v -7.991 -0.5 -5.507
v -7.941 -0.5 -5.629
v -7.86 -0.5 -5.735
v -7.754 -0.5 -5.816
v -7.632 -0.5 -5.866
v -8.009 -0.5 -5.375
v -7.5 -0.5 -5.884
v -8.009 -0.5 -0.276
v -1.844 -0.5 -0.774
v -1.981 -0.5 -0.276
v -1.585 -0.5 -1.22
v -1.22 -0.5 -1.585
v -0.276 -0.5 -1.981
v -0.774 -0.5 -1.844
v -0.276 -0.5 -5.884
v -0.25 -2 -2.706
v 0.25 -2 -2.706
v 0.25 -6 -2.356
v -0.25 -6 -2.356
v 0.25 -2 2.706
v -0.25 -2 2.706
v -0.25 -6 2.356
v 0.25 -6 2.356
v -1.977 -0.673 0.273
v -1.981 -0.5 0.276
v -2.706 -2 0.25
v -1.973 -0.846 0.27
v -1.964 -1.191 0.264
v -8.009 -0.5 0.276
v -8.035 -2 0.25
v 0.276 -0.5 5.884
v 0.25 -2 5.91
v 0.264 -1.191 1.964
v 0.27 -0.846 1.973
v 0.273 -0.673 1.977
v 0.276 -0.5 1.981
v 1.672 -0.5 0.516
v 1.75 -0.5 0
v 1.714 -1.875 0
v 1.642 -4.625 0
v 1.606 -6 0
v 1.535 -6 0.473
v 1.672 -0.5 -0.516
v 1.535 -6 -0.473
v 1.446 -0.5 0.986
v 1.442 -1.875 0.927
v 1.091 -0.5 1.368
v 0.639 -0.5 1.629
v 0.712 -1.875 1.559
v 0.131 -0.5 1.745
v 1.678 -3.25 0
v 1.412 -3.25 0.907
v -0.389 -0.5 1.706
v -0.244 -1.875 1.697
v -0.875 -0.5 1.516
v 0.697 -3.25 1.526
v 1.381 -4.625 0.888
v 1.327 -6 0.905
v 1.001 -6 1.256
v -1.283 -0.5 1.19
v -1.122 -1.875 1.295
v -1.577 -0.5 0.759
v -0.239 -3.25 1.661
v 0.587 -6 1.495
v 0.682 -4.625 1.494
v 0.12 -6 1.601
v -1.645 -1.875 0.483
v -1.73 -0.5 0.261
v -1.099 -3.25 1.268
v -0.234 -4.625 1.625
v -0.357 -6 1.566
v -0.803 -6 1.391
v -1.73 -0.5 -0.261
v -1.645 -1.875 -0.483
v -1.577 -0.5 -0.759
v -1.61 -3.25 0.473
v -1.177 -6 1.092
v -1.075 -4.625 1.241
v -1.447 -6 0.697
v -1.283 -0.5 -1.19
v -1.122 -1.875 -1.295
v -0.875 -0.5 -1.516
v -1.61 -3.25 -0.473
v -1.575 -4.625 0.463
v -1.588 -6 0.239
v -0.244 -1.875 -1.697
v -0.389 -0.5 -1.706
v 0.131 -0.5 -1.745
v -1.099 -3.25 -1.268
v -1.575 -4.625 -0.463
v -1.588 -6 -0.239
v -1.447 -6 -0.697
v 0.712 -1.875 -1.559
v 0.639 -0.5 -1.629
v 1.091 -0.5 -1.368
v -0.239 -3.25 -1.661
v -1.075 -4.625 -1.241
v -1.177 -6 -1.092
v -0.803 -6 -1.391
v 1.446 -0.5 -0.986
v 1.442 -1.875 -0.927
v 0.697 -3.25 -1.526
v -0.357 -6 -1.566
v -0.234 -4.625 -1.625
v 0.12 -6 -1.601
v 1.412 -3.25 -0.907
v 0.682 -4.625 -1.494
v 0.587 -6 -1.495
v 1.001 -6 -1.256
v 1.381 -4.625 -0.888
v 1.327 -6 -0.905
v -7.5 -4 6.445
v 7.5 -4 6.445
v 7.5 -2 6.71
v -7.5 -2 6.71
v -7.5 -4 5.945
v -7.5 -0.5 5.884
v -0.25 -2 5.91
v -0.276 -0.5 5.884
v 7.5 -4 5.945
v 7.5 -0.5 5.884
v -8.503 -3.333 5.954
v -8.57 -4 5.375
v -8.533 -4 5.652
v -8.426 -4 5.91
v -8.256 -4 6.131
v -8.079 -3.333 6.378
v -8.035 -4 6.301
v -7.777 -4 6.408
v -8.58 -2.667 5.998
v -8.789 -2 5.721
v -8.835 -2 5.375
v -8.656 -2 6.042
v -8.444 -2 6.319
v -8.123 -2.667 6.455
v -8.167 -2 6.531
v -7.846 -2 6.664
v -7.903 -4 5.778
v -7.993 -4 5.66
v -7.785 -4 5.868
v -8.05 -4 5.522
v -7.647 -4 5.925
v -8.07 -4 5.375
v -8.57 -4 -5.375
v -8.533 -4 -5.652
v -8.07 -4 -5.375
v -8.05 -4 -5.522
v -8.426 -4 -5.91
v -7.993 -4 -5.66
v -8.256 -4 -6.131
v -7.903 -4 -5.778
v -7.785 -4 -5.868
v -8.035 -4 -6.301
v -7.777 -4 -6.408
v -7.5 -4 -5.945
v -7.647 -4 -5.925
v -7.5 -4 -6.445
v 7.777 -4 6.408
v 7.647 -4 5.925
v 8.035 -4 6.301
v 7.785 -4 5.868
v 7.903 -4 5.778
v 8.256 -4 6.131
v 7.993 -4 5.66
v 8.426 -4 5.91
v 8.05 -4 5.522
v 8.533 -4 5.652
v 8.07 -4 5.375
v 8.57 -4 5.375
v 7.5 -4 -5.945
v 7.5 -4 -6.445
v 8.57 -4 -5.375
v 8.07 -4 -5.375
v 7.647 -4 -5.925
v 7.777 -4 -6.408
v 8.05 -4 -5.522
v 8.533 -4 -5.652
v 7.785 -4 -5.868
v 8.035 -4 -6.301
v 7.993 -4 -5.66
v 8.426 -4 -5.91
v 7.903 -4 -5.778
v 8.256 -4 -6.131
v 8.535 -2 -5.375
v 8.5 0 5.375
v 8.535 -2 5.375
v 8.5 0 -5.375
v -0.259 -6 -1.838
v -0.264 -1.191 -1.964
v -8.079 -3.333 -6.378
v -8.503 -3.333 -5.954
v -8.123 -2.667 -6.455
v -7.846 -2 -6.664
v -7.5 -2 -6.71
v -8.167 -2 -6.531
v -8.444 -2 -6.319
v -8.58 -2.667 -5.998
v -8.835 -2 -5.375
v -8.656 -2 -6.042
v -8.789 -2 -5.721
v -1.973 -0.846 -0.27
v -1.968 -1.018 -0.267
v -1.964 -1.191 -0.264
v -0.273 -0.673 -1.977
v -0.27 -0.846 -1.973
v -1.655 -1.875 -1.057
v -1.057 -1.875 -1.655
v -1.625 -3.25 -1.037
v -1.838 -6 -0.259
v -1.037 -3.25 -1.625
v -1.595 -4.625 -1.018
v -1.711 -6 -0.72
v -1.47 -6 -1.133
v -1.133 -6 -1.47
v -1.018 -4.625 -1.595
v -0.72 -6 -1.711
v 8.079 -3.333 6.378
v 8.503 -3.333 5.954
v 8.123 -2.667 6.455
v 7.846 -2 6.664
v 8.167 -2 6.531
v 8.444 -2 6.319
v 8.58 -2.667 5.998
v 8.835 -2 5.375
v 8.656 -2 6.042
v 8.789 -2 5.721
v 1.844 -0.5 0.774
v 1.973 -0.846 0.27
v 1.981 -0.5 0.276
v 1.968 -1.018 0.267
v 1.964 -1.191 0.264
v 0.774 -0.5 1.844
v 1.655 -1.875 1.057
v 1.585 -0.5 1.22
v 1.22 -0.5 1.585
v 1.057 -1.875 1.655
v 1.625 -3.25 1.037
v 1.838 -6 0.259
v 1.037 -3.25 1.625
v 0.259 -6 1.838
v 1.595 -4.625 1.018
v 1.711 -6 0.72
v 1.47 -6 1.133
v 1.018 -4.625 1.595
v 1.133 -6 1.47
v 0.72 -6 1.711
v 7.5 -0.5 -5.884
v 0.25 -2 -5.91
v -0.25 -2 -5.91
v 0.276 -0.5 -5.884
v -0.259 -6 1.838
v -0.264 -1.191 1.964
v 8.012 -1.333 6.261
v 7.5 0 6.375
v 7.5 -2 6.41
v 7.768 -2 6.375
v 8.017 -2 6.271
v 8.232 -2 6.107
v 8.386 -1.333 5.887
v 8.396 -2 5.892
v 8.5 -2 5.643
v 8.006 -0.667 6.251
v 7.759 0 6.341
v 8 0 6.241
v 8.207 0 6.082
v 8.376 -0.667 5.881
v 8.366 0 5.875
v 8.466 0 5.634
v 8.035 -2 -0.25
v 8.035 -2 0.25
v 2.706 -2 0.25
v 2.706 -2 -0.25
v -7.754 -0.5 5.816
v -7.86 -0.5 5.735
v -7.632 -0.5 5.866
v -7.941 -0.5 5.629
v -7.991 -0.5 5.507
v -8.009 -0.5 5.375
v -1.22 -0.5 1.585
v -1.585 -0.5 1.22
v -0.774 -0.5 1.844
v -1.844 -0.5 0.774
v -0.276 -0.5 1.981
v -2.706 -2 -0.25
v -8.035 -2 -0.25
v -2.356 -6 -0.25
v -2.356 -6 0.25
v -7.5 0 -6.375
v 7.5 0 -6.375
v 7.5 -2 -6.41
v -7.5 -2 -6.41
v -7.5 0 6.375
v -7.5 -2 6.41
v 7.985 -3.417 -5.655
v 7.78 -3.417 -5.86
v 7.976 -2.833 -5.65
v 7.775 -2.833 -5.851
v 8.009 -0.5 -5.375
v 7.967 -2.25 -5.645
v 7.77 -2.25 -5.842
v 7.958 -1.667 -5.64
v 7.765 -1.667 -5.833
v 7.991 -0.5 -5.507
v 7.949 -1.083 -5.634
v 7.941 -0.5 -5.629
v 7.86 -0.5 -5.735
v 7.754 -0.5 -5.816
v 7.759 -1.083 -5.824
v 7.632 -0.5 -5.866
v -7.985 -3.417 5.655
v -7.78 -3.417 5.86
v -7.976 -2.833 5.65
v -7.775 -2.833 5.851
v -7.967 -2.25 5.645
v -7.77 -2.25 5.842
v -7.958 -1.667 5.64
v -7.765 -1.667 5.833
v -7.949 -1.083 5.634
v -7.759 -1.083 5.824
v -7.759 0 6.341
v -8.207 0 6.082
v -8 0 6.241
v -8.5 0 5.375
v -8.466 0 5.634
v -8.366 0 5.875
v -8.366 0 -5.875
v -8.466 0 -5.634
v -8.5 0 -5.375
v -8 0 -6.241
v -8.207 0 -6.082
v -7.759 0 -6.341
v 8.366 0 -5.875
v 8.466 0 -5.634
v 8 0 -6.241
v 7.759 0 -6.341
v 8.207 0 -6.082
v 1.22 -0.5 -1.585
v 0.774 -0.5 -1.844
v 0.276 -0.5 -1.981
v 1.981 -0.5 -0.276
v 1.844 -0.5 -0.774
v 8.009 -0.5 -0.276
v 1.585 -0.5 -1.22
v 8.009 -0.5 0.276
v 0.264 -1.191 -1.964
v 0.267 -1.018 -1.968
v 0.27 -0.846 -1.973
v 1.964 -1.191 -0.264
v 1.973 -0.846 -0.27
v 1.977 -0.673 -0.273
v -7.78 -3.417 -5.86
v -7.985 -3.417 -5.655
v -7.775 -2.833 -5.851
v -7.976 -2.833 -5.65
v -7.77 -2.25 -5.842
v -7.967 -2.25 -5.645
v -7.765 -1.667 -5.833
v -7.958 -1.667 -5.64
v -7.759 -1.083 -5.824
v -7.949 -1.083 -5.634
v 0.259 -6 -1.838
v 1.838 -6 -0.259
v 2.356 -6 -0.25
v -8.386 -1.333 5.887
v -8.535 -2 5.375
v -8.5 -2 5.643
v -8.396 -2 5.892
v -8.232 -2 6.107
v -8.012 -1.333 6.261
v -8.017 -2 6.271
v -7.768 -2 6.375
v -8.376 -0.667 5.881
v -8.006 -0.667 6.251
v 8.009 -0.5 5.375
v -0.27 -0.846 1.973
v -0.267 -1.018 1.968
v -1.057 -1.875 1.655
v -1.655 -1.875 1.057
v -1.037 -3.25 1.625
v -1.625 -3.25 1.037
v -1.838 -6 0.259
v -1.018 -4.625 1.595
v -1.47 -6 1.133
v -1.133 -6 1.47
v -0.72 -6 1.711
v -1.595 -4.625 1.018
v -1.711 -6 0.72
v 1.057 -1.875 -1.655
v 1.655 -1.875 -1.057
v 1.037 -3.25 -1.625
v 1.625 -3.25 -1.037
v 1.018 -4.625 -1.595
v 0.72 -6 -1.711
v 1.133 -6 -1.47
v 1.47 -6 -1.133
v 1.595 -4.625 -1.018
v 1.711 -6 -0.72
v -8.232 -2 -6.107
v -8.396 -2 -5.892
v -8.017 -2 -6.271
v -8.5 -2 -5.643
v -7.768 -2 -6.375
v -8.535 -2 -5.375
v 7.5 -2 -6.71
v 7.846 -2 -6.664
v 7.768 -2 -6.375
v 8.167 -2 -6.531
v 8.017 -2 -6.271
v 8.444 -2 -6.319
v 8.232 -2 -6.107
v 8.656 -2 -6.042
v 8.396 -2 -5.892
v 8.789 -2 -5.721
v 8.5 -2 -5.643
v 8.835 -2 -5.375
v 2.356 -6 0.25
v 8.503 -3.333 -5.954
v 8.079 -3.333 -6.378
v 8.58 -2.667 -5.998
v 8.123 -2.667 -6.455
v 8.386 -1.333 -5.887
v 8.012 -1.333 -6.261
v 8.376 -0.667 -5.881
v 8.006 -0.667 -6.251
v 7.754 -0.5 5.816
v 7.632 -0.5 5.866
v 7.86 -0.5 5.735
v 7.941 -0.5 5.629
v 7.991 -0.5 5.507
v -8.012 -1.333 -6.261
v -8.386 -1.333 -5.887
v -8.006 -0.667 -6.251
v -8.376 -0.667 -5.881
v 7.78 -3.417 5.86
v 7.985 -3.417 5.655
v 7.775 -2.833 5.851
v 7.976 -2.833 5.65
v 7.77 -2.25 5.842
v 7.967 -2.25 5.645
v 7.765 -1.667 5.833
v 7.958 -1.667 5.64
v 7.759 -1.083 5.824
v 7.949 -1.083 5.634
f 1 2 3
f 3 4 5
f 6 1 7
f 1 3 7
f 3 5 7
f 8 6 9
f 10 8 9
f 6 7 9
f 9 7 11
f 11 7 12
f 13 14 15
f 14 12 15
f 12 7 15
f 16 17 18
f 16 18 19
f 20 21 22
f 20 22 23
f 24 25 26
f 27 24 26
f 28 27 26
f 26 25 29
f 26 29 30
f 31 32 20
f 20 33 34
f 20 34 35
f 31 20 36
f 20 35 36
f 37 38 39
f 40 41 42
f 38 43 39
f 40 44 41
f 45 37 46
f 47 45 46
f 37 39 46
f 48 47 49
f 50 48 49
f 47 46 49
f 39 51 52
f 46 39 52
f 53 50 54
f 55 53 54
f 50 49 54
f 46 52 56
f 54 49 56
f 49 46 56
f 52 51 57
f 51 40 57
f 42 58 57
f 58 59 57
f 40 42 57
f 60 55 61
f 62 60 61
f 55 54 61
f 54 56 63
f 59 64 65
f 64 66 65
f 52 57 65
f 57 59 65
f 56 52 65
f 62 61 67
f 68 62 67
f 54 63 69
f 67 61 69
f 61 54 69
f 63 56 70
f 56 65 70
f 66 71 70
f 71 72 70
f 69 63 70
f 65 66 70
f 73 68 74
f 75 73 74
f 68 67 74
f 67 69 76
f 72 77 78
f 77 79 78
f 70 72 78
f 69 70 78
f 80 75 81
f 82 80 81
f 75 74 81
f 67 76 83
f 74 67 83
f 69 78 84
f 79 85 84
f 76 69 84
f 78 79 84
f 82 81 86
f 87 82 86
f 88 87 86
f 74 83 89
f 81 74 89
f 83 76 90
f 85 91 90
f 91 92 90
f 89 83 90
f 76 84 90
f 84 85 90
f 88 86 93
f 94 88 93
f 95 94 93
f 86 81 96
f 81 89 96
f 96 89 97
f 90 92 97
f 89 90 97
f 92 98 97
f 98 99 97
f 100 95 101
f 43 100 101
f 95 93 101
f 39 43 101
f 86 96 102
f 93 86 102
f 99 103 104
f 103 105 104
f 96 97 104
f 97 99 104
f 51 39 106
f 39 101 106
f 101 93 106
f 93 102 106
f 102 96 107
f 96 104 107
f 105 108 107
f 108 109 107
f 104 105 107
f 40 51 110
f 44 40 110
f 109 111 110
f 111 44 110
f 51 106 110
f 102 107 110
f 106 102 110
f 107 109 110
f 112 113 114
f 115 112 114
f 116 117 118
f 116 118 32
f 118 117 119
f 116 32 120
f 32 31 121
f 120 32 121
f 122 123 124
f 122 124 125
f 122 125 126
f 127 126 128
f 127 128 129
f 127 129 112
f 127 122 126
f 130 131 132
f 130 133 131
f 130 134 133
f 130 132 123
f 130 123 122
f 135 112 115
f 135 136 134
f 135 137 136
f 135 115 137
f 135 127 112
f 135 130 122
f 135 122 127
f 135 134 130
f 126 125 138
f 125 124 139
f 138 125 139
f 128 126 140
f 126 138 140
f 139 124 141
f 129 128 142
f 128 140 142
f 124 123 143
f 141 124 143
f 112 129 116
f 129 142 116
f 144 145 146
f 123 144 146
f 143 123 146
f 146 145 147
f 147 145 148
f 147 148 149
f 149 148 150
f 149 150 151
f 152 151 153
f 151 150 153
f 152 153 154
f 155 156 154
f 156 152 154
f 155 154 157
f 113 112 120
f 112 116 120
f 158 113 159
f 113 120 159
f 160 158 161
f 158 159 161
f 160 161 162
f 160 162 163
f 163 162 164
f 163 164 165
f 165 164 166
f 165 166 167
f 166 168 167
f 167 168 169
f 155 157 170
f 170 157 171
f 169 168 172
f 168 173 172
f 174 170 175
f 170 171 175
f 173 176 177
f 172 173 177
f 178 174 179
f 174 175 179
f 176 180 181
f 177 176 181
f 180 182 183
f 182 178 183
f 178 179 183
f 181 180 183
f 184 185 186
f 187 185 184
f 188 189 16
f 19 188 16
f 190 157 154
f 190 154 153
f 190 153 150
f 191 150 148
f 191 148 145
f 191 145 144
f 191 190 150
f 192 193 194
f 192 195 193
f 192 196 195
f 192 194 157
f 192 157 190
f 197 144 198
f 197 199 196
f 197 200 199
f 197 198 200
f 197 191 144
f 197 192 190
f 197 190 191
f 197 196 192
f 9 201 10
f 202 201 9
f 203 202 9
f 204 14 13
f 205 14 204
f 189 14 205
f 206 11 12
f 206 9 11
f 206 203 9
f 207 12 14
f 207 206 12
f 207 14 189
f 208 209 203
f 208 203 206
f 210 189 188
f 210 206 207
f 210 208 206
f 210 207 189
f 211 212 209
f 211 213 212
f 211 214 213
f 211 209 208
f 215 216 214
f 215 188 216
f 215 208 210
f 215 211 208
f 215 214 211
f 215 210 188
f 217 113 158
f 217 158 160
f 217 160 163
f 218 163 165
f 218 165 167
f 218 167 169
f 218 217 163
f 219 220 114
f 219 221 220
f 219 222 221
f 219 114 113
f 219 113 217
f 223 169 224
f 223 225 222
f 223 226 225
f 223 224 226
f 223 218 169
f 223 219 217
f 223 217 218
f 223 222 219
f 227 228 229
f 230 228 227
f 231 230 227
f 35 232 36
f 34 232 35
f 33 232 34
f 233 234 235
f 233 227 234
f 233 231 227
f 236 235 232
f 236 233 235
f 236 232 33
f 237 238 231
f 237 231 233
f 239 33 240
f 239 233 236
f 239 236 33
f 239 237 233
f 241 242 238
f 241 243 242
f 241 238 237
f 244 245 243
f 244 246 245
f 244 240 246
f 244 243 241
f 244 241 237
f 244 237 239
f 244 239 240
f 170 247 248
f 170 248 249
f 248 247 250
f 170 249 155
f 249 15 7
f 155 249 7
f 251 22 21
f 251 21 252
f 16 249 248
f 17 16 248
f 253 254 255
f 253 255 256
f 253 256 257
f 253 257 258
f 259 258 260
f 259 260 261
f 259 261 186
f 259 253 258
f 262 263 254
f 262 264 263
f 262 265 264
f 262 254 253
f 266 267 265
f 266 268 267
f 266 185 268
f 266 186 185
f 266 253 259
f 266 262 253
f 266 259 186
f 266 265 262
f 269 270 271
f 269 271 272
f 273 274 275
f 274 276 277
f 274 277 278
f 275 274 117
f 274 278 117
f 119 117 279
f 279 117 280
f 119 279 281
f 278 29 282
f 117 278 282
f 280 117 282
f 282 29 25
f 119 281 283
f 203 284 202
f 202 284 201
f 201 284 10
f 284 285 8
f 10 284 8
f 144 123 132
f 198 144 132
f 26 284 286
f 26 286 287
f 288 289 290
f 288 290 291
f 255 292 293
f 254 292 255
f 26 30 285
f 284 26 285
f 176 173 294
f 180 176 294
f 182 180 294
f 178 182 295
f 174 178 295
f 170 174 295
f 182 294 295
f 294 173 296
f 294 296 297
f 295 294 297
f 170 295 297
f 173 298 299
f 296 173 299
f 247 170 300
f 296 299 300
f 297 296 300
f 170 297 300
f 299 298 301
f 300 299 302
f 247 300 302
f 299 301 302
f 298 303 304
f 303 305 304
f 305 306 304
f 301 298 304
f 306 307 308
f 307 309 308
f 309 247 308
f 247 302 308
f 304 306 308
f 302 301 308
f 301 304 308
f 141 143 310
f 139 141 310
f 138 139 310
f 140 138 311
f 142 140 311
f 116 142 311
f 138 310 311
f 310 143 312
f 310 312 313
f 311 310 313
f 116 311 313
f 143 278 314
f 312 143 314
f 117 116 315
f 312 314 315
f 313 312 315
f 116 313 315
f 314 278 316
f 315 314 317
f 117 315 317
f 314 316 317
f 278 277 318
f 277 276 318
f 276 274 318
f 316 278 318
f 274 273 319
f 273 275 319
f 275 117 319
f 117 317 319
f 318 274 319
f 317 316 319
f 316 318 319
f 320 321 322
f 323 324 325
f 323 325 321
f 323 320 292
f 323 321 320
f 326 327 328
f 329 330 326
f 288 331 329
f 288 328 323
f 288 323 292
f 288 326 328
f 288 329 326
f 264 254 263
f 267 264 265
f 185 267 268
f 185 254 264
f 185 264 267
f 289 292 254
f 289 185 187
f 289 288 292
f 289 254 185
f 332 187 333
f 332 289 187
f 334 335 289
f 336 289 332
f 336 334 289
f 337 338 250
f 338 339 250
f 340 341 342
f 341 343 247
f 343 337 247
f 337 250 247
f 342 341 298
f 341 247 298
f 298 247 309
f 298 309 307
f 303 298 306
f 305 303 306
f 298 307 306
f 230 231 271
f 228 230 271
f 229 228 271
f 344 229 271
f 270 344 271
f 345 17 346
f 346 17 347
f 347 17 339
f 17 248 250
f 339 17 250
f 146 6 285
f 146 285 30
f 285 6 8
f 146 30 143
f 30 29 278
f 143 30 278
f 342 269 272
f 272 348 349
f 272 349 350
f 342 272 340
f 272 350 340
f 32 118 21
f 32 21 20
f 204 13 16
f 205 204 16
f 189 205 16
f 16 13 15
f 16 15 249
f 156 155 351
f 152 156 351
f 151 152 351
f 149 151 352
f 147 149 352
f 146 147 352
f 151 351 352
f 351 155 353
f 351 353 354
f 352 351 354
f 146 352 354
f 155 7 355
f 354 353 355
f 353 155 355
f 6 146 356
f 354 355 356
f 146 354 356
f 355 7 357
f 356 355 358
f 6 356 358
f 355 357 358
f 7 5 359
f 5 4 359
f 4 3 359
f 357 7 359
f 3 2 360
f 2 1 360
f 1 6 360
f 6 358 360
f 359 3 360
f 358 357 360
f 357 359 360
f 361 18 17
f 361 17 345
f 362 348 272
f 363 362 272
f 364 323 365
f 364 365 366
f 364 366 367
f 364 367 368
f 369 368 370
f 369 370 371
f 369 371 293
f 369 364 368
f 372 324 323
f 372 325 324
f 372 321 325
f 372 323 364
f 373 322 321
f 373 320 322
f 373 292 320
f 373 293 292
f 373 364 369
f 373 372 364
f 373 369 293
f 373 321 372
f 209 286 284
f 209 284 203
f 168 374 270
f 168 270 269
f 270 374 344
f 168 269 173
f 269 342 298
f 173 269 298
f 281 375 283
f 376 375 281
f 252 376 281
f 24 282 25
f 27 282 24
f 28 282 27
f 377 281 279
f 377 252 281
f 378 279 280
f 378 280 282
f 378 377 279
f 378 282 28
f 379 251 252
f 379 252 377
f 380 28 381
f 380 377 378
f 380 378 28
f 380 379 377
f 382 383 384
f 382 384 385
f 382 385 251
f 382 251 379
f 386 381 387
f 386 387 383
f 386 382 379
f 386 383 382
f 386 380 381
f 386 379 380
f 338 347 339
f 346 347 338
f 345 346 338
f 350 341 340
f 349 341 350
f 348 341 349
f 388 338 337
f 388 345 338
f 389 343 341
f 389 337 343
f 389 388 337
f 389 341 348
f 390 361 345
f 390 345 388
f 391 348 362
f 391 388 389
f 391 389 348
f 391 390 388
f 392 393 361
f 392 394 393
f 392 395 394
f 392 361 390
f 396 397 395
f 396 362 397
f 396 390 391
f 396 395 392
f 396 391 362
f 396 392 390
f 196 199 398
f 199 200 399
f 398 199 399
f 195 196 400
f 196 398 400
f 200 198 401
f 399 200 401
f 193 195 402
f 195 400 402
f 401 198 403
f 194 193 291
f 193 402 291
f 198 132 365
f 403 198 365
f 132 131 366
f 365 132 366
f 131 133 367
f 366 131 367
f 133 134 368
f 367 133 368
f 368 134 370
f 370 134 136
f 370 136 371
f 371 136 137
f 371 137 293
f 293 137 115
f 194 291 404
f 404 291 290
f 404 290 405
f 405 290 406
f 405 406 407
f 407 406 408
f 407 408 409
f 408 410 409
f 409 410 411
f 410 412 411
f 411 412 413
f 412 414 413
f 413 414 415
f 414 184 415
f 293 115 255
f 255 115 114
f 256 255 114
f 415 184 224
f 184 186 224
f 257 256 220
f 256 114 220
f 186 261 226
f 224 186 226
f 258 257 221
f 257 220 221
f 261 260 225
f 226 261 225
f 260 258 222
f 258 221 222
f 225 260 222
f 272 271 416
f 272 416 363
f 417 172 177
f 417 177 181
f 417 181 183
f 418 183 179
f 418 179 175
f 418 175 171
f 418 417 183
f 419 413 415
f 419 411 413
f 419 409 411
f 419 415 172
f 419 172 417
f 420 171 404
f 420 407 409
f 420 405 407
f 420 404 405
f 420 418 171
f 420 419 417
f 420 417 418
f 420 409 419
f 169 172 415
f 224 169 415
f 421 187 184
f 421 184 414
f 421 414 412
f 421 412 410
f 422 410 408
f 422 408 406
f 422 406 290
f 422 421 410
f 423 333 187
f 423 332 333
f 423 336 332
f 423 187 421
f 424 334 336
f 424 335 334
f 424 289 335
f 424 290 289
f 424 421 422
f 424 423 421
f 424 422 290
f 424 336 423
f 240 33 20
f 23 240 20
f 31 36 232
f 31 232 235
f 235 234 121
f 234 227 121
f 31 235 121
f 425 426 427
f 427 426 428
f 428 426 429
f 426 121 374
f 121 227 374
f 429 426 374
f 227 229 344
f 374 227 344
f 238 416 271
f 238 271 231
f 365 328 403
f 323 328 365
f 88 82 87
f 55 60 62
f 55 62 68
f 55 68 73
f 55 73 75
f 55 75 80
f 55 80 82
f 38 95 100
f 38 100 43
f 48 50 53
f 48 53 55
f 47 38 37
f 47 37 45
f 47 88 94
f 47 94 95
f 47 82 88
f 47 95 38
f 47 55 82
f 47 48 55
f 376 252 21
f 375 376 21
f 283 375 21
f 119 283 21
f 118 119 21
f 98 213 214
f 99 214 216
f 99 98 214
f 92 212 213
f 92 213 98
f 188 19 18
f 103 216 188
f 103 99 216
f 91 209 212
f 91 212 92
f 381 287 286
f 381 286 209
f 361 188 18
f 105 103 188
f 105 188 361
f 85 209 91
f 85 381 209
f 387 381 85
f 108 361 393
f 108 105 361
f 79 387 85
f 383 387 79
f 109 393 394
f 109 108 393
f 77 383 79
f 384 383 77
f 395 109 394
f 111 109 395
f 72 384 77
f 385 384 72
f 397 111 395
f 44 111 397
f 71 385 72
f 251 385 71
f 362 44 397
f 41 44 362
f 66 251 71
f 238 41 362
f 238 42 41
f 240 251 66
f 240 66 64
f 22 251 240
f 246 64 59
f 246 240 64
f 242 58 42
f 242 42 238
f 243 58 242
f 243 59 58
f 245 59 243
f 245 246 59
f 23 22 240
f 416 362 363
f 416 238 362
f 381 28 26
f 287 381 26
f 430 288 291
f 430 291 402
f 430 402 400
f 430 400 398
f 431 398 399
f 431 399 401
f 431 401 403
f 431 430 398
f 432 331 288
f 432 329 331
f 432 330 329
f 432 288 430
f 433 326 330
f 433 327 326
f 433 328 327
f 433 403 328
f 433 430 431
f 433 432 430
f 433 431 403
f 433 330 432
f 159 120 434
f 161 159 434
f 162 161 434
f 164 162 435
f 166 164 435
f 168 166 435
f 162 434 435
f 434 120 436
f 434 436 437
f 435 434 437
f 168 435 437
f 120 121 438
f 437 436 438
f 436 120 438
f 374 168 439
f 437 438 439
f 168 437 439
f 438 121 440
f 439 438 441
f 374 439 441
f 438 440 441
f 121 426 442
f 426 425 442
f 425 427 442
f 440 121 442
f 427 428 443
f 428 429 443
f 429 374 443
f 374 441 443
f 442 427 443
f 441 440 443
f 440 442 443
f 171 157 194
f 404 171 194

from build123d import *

# Parameters (mm, degrees)
BOSS_EXTRUDE1_DEPTH = 4
BOSS_EXTRUDE1_DRAFT = 1
SHELL1_T            = -0.5
SKETCH2_R           = 2
BOSS_EXTRUDE2_DEPTH = 5.5
BOSS_EXTRUDE2_TAPER = 1.5
CIRPATTERN1_COUNT   = 4
SKETCH4_R           = 1.605977431
CUT_EXTRUDE1_DEPTH  = 5.5
CUT_EXTRUDE1_DRAFT  = 1.5
RIB2_START          = -8.069744096
RIB2_DEPTH          = 6.231928651
RIB2_START_2        = 1.837815445
RIB2_2_DEPTH        = 6.231928651
RIB2_START_3        = -5.944744096
RIB2_3_DEPTH        = 4.106928651
RIB2_4_DEPTH        = 4.106928651


with BuildPart() as part:
    # Sketch1 → Boss-Extrude1 (with draft: the straight prism first)
    with BuildSketch(Plane(origin=(0, 0, 0), x_dir=(1, 0, 0), z_dir=(0, 1, 0))):
        with BuildLine():
            Line((-7.5, -6.375), (7.5, -6.375))
            ThreePointArc((7.5, -6.375), (8.207106781, -6.082106781), (8.5, -5.375))
            Line((8.5, -5.375), (8.5, 5.375))
            ThreePointArc((8.5, 5.375), (8.207106781, 6.082106781), (7.5, 6.375))
            Line((7.5, 6.375), (-7.5, 6.375))
            ThreePointArc((-7.5, 6.375), (-8.207106781, 6.082106781), (-8.5, 5.375))
            Line((-8.5, 5.375), (-8.5, -5.375))
            ThreePointArc((-8.5, -5.375), (-8.207106781, -6.082106781), (-7.5, -6.375))
        make_face()
    extrude(amount=-BOSS_EXTRUDE1_DEPTH)
    # Boss-Extrude1: the draft: its side faces are tilted about the plane it starts from
    boss_extrude1_sides = [part.faces().sort_by_distance(p)[0] for p in [
        (0, -2, 6.375),
        (8.207106781, -2, 6.082106781),
        (8.5, -2, 0),
        (8.207106781, -2, -6.082106781),
        (0, -2, -6.375),
        (-8.207106781, -2, -6.082106781),
        (-8.5, -2, 0),
        (-8.207106781, -2, 6.082106781),
    ]]
    draft(boss_extrude1_sides, Plane(origin=(0, 0, 0), x_dir=(1, 0, 0), z_dir=(0, 1, 0)), BOSS_EXTRUDE1_DRAFT)

    # Shell1
    shell1_openings = [part.faces().sort_by_distance(p)[0] for p in [
        (0, -4, 0),
    ]]
    offset(amount=SHELL1_T, openings=shell1_openings, kind=Kind.INTERSECTION)

    # Sketch2 → Boss-Extrude2 (add)
    with BuildSketch(Plane.XZ.offset(0.5)):
        Circle(SKETCH2_R)
    extrude(amount=BOSS_EXTRUDE2_DEPTH, taper=BOSS_EXTRUDE2_TAPER)

    # Rib1: read off the stored shape, not the designer's step
    # Rib1: loft between two sections, ruled curve by curve
    rib1_from = [
        Edge.make_line((-1.982384256, -0.5, 0.264863479), (-2.837165081, -0.5, 0.25)),
        Edge.make_line((-2.837165081, -0.5, -0.25), (-1.982384256, -0.5, -0.264863479)),
        Edge.make_line((-2.837165081, -0.5, -0.25), (-2.837165081, -0.5, 0.25)),
        Edge.make_line((-1.982384256, -0.5, -0.264863479), (-1.982384256, -0.5, 0.264863479)),
    ]
    rib1_to = [
        Edge.make_line((-1.837815545, -6, 0.259010132), (-2.355977431, -6, 0.25)),
        Edge.make_line((-2.355977431, -6, -0.25), (-1.837815545, -6, -0.259010132)),
        Edge.make_line((-2.355977431, -6, -0.25), (-2.355977431, -6, 0.25)),
        Edge.make_line((-1.837815545, -6, -0.259010132), (-1.837815545, -6, 0.259010132)),
    ]
    rib1 = Solid(Shell([*[Face.make_surface_from_curves(rib1_from[k], rib1_to[k]) for k in range(4)], Face(Wire(rib1_from)), Face(Wire(rib1_to))]))
    add(rib1)

    # CirPattern1: Rib1 ×4 about axis
    cirpattern1_axis = Axis((0, 0, 0), (0, 1, 0))
    for i in range(1, CIRPATTERN1_COUNT):
        add(rib1.rotate(cirpattern1_axis, i * 360 / CIRPATTERN1_COUNT))


with BuildPart() as cut_extrude1_tool:
    # Sketch4 → Cut-Extrude1 (with draft: the straight prism first)
    with BuildSketch(Plane.XZ.offset(6)):
        Circle(SKETCH4_R)
    extrude(amount=-CUT_EXTRUDE1_DEPTH)
    # Cut-Extrude1: the draft: its side faces are tilted about the plane it starts from
    cut_extrude1_sides = [cut_extrude1_tool.faces().sort_by_distance(p)[0] for p in [
        (-1.605977431, -3.25, 0),
    ]]
    draft(cut_extrude1_sides, Plane.XZ.offset(6), CUT_EXTRUDE1_DRAFT)


with BuildPart() as part_1:
    add(part.part)

    # Cut-Extrude1: cut by cut_extrude1_tool
    add(cut_extrude1_tool.part, mode=Mode.SUBTRACT)

    # Sweep1: sweep along a path in Sketch6
    with BuildLine(Plane(origin=(0, -2, 0), x_dir=(1, 0, 0), z_dir=(0, 1, 0))) as sweep1_path:
        Line((-8.56982026, 5.375), (-8.56982026, -5.375))
        ThreePointArc((-8.56982026, -5.375), (-8.25647716, -6.13147716), (-7.5, -6.44482026))
        Line((-7.5, -6.44482026), (7.5, -6.44482026))
        ThreePointArc((7.5, -6.44482026), (8.25647716, -6.13147716), (8.56982026, -5.375))
        Line((8.56982026, -5.375), (8.56982026, 5.375))
        ThreePointArc((8.56982026, 5.375), (8.25647716, 6.13147716), (7.5, 6.44482026))
        Line((7.5, 6.44482026), (-7.5, 6.44482026))
        ThreePointArc((-7.5, 6.44482026), (-8.25647716, 6.13147716), (-8.56982026, 5.375))
    # Sketch5 → Sweep1 (sweep)
    with BuildSketch(Plane(origin=(0, 0, 0), x_dir=(0, 0, -1), z_dir=(1, 0, 0))):
        Polygon((6.44482026, -4), (6.40991013, -2), (6.70991013, -2), align=None)
    sweep(path=sweep1_path.line)

    # Rib2: read off the stored shape, not the designer's step
    # Rib2 outline → Rib2 (add)
    with BuildSketch(Plane.YZ.offset(RIB2_START)):
        Polygon((-2, -0.25), (-0.5, -0.276182597), (-0.5, 0.276182597), (-2, 0.25), align=None)
    extrude(amount=RIB2_DEPTH)

    # Rib2 2 outline → Rib2 2 (add)
    with BuildSketch(Plane.YZ.offset(RIB2_START_2)):
        Polygon((-2, -0.25), (-0.5, -0.276182597), (-0.5, 0.276182597), (-2, 0.25), align=None)
    extrude(amount=RIB2_2_DEPTH)

    # Rib2 3 outline → Rib2 3 (add)
    with BuildSketch(Plane.XY.offset(RIB2_START_3)):
        Polygon((-0.276182597, -0.5), (-0.25, -2), (0.25, -2), (0.276182597, -0.5), align=None)
    extrude(amount=RIB2_3_DEPTH)

    # Rib2 4 outline → Rib2 4 (add)
    with BuildSketch(Plane.XY.offset(RIB2_START_2)):
        Polygon((-0.276182597, -0.5), (-0.25, -2), (0.25, -2), (0.276182597, -0.5), align=None)
    extrude(amount=RIB2_4_DEPTH)


solid = part_1.part
